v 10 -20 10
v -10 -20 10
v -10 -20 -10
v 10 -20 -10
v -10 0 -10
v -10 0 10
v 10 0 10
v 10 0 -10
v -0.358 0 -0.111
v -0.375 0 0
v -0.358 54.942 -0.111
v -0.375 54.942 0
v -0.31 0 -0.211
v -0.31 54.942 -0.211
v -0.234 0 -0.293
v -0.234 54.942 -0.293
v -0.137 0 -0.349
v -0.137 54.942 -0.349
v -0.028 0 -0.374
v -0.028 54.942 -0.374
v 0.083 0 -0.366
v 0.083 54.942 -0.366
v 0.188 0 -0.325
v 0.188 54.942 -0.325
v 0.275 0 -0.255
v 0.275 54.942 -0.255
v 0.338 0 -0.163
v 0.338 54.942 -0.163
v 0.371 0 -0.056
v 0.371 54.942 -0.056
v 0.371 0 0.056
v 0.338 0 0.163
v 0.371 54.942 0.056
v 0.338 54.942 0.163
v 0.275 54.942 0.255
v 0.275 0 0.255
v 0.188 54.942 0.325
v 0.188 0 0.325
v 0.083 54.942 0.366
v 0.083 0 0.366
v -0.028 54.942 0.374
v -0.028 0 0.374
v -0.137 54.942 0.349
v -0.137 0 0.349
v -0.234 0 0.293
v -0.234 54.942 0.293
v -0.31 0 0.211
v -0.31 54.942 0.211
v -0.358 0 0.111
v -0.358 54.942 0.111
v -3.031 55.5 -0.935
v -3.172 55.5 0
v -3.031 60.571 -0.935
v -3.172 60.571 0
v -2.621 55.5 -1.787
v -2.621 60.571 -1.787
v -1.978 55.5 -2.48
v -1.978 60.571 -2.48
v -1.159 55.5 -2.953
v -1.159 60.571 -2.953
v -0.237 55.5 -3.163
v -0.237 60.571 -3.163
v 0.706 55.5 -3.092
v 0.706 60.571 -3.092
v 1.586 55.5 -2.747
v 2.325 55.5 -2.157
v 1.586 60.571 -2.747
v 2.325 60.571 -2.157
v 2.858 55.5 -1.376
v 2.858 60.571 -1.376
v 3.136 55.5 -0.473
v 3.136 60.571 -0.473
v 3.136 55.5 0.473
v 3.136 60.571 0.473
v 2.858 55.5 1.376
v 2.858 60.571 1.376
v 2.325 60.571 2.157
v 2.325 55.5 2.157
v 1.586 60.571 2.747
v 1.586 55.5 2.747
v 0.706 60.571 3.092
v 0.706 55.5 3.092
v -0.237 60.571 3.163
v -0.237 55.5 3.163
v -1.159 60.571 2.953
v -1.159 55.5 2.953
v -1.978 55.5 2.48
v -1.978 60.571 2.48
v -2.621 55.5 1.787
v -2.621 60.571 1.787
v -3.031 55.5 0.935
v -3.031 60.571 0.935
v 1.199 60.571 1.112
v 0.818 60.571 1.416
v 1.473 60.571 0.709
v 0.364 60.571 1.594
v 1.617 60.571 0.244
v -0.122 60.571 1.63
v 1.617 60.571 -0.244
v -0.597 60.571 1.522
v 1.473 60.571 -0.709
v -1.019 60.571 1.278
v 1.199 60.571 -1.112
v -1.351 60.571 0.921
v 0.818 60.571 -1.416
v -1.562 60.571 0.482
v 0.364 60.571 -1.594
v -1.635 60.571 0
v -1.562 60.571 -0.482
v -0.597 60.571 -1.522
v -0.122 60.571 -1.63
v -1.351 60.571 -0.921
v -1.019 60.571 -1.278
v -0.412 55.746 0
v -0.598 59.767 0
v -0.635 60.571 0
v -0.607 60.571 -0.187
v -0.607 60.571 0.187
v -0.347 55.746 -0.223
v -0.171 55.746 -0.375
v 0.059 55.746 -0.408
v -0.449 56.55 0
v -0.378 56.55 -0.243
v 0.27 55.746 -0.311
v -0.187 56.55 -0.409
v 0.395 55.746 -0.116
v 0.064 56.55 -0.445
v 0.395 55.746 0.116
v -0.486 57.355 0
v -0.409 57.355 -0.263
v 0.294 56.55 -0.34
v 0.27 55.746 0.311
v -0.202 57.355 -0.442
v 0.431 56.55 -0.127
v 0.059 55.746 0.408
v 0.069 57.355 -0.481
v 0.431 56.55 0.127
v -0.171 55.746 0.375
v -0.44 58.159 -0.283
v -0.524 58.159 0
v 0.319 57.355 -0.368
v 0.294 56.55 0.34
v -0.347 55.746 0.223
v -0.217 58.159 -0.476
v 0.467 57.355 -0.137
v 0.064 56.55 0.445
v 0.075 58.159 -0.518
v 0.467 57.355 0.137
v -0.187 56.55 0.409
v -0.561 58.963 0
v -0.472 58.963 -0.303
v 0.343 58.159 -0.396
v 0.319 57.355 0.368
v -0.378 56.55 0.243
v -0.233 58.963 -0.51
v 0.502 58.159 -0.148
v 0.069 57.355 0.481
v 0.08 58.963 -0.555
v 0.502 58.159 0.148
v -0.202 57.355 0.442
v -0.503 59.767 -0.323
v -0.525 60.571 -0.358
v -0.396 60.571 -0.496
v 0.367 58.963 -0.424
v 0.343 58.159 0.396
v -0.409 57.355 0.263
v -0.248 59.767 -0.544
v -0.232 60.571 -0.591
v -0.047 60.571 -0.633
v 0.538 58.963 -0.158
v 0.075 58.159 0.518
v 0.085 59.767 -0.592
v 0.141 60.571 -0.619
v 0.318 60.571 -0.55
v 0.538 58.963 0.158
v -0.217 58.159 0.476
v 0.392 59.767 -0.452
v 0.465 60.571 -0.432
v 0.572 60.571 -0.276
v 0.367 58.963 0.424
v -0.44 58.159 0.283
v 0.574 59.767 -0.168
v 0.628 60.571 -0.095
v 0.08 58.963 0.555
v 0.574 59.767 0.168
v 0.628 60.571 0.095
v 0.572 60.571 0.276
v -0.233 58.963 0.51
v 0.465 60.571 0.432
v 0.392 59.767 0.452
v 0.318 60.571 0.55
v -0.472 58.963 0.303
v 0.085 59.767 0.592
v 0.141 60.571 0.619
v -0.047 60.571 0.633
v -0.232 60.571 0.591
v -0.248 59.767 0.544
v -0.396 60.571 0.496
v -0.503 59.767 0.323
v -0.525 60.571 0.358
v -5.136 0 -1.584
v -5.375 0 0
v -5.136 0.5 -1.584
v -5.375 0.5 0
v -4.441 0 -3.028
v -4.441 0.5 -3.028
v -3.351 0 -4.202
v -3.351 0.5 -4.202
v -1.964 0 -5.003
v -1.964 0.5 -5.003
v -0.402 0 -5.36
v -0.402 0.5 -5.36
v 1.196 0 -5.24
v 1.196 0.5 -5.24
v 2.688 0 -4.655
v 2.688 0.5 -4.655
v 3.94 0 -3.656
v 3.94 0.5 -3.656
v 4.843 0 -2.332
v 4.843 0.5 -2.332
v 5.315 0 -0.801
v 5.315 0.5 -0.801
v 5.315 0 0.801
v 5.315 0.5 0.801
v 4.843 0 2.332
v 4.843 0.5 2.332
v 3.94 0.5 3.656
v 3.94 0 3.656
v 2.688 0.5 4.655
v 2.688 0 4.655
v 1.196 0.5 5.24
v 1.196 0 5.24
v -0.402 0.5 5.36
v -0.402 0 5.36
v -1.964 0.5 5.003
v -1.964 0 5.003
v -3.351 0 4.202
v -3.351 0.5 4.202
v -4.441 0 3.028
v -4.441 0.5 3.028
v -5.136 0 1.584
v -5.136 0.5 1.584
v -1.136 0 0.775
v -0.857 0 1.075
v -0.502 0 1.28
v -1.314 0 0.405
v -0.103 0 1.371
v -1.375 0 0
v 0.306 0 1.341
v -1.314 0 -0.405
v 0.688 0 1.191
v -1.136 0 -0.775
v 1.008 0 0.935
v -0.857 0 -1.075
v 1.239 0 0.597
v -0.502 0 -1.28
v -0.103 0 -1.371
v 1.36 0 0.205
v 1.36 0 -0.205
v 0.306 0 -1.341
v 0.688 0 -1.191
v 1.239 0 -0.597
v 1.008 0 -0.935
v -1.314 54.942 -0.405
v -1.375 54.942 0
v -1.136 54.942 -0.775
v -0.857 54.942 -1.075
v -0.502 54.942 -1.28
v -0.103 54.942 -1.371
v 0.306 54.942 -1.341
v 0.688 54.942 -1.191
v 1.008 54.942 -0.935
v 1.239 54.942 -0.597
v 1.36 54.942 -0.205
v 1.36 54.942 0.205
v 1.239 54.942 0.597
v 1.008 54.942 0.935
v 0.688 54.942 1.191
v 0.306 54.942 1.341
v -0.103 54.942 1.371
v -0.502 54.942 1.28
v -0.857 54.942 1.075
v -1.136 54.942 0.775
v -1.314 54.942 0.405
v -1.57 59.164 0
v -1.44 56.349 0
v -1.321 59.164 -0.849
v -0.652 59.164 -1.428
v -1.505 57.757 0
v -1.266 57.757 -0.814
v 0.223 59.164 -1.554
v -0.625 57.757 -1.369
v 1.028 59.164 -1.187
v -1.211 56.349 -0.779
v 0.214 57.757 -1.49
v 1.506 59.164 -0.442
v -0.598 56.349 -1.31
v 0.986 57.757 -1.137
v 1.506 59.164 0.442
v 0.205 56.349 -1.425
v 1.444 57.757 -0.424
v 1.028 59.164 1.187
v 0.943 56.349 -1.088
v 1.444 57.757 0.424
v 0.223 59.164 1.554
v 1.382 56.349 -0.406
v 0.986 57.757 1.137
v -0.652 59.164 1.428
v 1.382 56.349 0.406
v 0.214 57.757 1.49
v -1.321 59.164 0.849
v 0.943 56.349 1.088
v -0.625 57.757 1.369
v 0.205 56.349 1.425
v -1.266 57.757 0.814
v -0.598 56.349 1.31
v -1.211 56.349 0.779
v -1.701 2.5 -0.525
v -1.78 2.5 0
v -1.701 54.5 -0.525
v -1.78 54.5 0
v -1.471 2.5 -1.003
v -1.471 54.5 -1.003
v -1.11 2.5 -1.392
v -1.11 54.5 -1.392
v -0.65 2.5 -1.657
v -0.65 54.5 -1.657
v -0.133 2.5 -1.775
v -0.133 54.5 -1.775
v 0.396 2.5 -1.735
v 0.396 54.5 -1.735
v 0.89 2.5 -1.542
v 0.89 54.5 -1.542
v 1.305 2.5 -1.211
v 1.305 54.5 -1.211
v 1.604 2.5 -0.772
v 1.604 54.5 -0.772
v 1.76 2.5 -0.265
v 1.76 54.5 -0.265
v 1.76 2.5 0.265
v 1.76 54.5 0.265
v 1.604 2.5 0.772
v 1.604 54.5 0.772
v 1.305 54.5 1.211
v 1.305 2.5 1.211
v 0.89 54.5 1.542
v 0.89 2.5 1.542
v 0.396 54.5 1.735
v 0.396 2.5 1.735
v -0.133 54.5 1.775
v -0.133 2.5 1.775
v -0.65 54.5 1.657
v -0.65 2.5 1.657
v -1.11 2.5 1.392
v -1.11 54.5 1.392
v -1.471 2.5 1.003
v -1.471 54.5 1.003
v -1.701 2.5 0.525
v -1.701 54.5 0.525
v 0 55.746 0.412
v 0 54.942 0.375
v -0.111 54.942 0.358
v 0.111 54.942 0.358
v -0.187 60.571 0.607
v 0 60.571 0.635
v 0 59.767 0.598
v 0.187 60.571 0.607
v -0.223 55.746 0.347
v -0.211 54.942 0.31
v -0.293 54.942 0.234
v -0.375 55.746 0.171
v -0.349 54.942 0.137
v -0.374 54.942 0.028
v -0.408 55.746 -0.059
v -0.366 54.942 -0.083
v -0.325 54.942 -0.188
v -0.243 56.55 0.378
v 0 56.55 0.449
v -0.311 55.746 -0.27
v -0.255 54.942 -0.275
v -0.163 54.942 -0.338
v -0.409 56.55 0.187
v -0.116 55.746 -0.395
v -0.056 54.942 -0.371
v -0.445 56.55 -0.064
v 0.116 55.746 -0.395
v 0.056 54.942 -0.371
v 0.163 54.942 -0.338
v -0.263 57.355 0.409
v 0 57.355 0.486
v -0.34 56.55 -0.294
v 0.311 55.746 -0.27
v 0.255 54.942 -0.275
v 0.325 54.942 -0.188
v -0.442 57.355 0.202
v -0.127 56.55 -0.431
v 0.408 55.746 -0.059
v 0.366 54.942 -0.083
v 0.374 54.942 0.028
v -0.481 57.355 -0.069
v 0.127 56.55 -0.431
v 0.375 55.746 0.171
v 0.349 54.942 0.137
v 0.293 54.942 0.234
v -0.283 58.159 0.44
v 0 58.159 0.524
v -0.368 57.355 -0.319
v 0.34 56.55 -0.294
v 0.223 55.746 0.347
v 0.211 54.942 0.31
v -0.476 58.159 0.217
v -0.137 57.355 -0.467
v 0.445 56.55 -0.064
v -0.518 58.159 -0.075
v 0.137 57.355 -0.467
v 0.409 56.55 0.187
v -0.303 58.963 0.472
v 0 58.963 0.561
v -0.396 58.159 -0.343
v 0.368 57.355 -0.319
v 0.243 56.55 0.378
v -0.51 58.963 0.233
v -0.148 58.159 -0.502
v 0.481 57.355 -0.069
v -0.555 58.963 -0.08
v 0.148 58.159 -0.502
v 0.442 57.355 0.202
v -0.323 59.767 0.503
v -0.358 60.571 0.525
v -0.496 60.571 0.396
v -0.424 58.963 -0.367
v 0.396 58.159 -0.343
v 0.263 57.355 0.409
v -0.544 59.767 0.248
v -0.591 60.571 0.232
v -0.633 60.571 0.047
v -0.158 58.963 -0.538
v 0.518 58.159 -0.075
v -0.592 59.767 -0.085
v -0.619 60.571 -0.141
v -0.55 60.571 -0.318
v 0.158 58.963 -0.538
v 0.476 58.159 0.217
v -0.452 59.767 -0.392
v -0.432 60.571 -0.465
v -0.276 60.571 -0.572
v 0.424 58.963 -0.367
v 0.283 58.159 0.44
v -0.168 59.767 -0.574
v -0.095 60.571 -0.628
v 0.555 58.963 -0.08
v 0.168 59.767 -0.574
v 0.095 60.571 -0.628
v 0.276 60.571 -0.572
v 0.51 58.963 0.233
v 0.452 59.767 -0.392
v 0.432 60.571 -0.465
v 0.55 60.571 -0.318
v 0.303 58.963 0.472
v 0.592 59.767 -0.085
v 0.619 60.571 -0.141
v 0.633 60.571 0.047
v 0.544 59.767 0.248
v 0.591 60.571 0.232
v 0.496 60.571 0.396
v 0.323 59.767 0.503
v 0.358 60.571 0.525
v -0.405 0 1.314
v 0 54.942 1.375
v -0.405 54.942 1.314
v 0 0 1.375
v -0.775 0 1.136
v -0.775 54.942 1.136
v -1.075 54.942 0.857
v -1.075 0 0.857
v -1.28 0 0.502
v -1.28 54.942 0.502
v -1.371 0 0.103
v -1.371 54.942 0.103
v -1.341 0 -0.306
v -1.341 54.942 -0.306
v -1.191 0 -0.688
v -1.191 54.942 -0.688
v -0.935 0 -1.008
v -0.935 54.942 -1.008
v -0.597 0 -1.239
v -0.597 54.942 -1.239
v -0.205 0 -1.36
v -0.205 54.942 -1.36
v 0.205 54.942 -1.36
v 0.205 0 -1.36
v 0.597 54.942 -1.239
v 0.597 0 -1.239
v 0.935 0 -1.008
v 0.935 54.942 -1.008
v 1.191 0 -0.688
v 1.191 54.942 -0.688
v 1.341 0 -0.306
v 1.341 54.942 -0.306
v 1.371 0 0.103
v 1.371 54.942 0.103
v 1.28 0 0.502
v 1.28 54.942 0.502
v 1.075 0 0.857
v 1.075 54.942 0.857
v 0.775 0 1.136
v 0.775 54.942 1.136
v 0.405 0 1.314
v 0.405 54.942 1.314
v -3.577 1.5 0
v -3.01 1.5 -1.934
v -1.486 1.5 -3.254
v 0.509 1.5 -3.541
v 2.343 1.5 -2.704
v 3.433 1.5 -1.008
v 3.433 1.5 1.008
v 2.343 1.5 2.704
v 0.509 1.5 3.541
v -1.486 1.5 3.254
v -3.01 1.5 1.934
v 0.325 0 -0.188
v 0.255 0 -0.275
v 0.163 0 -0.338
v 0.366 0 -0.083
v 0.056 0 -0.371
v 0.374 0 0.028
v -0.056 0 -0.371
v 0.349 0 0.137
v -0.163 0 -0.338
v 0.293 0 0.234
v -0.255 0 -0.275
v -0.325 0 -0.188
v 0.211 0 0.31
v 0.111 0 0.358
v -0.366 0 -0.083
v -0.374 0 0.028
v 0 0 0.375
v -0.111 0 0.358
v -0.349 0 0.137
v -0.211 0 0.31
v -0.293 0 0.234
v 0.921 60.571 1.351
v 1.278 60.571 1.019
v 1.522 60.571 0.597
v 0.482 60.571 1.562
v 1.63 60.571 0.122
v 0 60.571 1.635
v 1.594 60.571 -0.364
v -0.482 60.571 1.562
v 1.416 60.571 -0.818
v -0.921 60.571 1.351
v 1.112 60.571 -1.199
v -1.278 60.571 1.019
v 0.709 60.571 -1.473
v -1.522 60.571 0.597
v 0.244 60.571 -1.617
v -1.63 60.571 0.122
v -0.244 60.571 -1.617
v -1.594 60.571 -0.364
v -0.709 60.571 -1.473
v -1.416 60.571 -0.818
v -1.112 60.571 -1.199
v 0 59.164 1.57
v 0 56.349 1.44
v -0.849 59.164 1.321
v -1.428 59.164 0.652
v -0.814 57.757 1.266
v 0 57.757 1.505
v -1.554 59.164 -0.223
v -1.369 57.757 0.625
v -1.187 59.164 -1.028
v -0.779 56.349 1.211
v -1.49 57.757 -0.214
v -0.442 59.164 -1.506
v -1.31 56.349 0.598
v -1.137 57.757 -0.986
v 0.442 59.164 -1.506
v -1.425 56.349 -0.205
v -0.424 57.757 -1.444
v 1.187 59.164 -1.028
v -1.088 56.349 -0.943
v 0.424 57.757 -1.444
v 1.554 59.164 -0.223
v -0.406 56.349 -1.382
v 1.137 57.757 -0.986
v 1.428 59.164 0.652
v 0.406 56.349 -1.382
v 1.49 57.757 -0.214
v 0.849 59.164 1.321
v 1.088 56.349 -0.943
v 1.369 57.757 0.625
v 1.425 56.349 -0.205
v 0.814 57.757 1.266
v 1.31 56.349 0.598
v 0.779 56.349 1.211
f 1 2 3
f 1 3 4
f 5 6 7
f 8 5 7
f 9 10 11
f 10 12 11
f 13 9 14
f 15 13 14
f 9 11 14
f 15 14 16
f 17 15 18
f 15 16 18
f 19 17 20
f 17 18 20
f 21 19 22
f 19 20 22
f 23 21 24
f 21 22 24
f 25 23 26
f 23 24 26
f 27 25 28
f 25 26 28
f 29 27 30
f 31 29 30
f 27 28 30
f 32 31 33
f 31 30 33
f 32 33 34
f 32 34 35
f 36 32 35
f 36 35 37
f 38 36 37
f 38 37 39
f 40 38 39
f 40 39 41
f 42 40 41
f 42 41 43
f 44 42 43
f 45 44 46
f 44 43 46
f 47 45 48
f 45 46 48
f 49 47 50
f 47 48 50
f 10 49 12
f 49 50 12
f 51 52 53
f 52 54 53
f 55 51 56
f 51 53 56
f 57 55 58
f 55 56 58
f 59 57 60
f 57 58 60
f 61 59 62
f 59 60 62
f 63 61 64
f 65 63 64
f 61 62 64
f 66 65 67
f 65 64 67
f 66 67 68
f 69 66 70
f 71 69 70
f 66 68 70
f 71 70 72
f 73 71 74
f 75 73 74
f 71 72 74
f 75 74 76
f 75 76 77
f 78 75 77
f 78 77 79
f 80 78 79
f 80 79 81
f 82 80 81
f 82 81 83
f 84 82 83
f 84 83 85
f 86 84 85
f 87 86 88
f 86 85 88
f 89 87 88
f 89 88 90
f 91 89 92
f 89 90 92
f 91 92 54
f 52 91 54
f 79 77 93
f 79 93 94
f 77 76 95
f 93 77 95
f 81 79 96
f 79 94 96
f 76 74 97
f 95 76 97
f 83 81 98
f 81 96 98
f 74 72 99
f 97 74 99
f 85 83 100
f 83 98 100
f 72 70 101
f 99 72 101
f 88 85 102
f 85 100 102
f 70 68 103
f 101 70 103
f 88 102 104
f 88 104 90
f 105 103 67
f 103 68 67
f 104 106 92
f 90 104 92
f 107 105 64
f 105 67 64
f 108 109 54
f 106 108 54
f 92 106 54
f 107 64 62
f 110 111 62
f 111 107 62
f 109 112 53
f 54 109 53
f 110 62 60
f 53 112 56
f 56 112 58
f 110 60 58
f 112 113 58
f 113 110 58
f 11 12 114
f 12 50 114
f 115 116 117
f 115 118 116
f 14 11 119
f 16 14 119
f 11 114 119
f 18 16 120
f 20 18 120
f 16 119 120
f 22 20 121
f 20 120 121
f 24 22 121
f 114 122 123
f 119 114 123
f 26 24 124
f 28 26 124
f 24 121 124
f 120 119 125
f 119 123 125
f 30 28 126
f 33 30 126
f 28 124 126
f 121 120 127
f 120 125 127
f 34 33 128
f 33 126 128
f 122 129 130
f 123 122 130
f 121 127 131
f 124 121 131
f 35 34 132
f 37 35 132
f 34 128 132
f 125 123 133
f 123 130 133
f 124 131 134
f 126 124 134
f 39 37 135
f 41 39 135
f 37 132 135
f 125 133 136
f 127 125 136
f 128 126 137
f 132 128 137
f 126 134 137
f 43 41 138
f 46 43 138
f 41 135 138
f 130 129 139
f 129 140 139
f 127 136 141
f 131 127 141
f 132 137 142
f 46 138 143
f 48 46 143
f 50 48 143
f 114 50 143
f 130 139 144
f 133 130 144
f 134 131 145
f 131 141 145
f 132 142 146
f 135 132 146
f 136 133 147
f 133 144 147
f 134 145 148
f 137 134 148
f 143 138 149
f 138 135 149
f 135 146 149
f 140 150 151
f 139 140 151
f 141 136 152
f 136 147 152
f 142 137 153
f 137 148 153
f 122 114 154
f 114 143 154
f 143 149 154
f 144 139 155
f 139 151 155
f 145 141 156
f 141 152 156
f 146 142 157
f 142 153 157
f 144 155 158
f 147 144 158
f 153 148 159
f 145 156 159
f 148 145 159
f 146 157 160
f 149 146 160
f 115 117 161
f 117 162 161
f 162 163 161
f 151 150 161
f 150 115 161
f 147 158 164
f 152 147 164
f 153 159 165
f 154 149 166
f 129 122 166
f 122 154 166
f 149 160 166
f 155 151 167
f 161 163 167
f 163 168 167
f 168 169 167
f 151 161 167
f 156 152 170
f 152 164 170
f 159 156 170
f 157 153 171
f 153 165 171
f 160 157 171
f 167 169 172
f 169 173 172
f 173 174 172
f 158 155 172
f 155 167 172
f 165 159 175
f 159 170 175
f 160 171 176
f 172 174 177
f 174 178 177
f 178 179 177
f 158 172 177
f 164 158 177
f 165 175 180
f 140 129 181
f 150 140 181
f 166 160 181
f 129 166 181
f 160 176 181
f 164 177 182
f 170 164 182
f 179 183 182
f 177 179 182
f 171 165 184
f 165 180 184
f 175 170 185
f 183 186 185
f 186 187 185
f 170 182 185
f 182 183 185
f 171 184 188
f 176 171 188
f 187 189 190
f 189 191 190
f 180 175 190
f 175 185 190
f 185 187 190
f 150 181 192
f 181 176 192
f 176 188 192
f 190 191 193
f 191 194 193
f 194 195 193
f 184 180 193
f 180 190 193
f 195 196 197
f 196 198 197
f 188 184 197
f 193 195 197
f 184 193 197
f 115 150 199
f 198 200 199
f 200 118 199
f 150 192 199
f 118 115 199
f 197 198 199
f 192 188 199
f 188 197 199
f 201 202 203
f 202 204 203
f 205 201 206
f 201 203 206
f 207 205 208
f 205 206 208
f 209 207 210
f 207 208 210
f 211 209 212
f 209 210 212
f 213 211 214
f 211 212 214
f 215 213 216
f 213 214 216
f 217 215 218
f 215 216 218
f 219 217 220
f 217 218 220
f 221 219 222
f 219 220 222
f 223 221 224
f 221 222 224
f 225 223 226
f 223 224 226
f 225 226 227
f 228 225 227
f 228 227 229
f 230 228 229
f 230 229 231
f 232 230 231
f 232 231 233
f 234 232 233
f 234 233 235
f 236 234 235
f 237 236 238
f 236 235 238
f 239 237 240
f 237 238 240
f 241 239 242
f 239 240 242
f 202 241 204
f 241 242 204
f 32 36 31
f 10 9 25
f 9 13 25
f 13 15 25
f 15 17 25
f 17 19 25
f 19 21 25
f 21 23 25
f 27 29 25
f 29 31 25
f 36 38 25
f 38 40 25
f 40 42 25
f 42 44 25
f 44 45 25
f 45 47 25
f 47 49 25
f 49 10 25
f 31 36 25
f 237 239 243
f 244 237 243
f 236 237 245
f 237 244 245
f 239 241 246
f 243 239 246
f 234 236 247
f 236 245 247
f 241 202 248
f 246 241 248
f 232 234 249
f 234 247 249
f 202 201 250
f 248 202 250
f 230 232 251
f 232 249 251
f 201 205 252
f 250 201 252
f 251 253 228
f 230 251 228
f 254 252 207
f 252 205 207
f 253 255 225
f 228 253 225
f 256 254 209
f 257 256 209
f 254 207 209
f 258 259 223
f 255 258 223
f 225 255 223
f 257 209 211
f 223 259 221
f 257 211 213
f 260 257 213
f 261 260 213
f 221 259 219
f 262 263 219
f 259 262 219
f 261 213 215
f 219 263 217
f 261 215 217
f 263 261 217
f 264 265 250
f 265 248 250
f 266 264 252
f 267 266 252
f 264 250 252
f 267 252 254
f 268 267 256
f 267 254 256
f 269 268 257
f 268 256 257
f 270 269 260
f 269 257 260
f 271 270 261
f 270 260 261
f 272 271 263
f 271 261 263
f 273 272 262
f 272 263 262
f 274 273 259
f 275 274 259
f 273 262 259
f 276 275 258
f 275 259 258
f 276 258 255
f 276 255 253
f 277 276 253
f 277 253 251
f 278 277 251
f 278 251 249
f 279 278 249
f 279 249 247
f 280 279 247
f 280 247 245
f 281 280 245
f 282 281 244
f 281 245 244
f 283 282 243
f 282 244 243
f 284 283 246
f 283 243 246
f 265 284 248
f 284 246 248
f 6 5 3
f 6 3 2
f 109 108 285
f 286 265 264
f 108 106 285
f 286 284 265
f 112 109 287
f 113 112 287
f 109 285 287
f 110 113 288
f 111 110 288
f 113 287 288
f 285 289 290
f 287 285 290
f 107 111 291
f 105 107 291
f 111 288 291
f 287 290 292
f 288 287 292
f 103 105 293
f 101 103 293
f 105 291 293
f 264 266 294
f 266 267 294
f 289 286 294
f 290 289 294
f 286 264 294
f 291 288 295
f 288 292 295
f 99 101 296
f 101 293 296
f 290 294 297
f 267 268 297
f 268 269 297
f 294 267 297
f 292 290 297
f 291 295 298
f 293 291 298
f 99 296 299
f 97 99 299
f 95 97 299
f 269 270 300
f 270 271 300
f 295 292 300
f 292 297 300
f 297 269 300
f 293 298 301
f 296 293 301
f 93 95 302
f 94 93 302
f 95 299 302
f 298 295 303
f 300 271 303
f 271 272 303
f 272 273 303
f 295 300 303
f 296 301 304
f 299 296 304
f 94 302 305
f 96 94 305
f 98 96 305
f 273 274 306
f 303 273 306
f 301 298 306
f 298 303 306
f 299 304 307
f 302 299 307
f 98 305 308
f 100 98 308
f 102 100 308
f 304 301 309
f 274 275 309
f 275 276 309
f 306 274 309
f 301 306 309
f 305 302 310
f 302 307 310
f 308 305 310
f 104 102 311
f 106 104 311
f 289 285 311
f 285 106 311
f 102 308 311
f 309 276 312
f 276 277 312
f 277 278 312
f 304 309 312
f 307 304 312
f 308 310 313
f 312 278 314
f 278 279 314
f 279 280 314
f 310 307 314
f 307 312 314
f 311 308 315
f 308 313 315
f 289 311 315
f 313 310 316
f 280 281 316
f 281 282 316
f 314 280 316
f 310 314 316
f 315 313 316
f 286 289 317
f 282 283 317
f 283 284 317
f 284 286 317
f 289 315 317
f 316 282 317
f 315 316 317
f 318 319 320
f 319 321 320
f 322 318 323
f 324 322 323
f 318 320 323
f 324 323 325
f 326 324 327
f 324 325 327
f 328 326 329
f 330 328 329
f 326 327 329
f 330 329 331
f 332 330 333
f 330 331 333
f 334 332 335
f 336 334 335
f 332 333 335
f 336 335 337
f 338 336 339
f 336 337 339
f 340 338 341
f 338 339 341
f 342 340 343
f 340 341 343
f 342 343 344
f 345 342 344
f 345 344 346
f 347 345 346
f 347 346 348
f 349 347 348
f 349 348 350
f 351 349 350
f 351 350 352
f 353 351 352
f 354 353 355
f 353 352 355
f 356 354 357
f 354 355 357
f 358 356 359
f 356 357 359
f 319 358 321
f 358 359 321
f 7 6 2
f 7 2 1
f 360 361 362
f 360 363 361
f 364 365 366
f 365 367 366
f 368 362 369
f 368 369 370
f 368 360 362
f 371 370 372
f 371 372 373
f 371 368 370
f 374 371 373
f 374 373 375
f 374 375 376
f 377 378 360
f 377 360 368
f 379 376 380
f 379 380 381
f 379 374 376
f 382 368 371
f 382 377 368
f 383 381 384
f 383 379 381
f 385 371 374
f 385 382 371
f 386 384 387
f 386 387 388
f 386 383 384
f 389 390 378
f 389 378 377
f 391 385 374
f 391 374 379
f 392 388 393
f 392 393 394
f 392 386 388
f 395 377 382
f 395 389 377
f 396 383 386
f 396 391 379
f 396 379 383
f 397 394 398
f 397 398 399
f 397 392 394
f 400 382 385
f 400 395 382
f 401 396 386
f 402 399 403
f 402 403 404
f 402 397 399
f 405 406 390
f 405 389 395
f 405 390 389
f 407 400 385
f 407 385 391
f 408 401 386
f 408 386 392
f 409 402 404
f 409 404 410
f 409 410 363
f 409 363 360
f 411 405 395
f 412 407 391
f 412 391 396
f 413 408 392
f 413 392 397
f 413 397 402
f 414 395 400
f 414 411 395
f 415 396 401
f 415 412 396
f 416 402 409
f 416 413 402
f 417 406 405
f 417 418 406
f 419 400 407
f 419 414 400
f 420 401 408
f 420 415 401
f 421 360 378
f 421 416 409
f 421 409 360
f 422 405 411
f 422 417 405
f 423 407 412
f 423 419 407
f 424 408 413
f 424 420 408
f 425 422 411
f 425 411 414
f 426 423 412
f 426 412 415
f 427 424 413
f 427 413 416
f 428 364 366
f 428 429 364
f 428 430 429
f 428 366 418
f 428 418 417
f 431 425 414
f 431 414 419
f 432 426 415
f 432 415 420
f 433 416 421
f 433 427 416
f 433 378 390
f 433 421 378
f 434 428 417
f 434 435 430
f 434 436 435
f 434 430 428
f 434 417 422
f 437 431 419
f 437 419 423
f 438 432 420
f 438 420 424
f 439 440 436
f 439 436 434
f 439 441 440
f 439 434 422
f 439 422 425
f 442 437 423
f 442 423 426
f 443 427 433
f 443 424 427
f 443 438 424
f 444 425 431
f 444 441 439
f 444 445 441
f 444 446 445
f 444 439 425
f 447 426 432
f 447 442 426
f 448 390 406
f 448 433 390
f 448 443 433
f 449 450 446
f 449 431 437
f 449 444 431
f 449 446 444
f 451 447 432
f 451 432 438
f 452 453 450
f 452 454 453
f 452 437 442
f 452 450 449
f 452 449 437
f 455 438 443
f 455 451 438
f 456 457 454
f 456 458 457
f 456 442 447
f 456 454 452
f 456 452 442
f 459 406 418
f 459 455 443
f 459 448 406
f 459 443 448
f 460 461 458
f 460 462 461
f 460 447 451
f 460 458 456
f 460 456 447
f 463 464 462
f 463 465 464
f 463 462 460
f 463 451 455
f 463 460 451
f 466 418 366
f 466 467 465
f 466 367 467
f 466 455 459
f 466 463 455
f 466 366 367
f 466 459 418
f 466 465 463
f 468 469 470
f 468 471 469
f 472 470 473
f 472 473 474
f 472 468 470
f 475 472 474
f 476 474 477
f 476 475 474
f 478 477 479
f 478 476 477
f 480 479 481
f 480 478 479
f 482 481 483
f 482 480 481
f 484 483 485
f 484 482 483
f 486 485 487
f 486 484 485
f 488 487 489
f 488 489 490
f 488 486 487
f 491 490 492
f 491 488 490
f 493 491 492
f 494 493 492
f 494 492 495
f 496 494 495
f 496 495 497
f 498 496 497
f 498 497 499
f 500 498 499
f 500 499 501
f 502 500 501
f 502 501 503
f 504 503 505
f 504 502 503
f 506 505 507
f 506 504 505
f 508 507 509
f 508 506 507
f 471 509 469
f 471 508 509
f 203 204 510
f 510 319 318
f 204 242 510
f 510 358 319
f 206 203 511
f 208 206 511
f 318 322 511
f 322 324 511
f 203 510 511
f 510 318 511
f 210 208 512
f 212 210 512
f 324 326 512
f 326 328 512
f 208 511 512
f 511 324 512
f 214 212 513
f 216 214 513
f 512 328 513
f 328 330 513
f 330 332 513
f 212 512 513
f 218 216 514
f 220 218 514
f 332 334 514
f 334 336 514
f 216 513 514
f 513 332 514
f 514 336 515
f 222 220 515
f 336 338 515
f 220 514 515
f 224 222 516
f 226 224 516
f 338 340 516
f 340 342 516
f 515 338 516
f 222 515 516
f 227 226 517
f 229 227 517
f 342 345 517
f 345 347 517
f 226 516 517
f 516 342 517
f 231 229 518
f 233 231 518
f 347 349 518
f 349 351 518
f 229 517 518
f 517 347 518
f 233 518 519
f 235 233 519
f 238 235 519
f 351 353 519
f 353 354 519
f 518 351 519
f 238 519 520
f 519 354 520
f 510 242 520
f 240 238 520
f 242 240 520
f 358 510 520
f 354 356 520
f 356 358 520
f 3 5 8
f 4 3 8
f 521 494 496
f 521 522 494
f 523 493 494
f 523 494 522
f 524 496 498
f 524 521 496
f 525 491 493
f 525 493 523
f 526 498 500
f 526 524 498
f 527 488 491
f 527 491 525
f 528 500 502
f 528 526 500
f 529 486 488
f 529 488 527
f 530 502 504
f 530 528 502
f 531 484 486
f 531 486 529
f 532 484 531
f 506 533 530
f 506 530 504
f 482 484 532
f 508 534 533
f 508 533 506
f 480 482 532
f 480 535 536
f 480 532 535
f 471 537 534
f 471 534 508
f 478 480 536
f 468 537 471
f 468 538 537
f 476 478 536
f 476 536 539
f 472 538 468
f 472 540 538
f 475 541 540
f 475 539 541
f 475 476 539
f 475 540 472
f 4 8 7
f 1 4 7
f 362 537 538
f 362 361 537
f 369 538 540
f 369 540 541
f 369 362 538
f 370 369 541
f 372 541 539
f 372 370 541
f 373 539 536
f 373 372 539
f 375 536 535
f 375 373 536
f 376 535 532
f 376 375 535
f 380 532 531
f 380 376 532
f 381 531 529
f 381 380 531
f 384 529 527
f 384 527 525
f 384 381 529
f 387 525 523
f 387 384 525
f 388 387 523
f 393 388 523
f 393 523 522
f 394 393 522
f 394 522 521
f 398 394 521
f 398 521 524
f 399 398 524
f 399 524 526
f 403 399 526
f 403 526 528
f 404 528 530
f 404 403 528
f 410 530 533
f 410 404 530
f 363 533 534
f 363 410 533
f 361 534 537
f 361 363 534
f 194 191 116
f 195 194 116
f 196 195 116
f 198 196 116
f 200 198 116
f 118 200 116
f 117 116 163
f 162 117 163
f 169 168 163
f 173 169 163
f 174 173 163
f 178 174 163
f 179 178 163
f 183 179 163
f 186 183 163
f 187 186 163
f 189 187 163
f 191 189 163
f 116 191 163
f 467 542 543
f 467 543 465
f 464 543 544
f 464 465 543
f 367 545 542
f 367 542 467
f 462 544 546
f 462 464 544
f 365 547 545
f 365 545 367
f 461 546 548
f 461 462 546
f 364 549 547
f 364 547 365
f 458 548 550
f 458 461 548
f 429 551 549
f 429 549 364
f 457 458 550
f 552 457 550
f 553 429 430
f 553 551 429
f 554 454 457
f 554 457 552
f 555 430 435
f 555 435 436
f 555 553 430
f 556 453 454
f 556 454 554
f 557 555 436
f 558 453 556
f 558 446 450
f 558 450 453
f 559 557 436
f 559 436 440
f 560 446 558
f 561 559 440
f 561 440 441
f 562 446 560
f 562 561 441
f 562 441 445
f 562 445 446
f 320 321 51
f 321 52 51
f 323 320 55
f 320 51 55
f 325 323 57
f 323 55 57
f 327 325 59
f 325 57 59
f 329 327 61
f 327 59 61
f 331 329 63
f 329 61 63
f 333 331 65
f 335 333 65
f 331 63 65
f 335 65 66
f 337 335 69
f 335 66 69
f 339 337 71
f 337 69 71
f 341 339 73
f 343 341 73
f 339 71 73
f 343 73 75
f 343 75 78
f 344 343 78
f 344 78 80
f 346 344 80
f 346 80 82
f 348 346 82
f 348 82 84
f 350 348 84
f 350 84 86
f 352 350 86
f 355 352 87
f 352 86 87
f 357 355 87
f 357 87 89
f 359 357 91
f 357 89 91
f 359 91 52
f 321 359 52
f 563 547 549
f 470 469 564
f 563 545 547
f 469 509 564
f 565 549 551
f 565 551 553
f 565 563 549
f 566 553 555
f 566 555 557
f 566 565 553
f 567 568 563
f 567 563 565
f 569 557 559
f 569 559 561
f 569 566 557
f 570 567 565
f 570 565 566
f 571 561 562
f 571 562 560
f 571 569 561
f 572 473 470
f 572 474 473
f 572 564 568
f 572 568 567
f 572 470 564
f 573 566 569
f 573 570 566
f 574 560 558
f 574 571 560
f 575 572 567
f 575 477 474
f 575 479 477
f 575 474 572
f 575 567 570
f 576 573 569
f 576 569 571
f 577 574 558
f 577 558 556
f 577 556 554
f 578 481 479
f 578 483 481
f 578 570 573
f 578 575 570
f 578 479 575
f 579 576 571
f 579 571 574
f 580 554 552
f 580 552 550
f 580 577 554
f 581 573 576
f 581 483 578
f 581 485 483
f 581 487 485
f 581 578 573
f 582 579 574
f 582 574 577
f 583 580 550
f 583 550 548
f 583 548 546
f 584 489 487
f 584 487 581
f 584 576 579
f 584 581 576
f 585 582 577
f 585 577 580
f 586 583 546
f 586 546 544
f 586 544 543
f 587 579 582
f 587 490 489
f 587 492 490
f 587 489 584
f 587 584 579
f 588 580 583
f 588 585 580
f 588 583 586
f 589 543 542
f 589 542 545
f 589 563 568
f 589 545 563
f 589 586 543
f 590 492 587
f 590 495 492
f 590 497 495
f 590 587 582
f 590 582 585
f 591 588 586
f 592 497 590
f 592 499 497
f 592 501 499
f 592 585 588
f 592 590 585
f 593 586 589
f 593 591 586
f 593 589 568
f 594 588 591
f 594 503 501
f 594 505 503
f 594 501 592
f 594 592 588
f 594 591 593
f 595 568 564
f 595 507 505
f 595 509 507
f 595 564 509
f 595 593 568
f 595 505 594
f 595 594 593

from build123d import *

# Parameters (mm, degrees)
CROQUIS4_W              = 20
CROQUIS4_H              = 20
SALIENTE_EXTRUIR1_DEPTH = 20


with BuildPart() as part:
    # Croquis1 → Revolución1 (revolve)
    with BuildSketch(Plane.XY, mode=Mode.PRIVATE) as revoluci_n1_sk:
        Polygon((5.375, 0), (5.375, 0.5), (1.78, 2.5), (1.78, 54.5), (3.171785891, 55.5), (3.171785891, 60.571), (1.635, 60.571), (1.375, 54.942193309), (1.375, 0), align=None)
        Polygon((0.375, 0), (0.375, 54.942193309), (0.635, 60.571), (0.442390715, 60.571), (0, 60.571), (0, 0), align=None)
    revolve(revoluci_n1_sk.sketch.rotate(Axis((0, 60.571, 0), (0, -1, 0)), 180), axis=Axis((0, 60.571, 0), (0, -1, 0)))


with BuildPart() as body_2:
    # Croquis3 → Revolución2 (revolve)
    with BuildSketch(Plane.XY, mode=Mode.PRIVATE) as revoluci_n2_sk:
        Polygon((0.375, 54.942193309), (0.635, 60.571), (1.635, 60.571), (1.375, 54.942193309), (1.375, 0), (0.375, 0), align=None)
    revolve(revoluci_n2_sk.sketch.rotate(Axis((0, 55.5, 0), (0, -1, 0)), 90), axis=Axis((0, 55.5, 0), (0, -1, 0)))


with BuildPart() as body_3:
    # Croquis4 → Saliente-Extruir1 (new body)
    with BuildSketch(Plane.XZ):
        Rectangle(CROQUIS4_W, CROQUIS4_H)
    extrude(amount=SALIENTE_EXTRUIR1_DEPTH)


solid = Compound([part.part, body_2.part, body_3.part])
